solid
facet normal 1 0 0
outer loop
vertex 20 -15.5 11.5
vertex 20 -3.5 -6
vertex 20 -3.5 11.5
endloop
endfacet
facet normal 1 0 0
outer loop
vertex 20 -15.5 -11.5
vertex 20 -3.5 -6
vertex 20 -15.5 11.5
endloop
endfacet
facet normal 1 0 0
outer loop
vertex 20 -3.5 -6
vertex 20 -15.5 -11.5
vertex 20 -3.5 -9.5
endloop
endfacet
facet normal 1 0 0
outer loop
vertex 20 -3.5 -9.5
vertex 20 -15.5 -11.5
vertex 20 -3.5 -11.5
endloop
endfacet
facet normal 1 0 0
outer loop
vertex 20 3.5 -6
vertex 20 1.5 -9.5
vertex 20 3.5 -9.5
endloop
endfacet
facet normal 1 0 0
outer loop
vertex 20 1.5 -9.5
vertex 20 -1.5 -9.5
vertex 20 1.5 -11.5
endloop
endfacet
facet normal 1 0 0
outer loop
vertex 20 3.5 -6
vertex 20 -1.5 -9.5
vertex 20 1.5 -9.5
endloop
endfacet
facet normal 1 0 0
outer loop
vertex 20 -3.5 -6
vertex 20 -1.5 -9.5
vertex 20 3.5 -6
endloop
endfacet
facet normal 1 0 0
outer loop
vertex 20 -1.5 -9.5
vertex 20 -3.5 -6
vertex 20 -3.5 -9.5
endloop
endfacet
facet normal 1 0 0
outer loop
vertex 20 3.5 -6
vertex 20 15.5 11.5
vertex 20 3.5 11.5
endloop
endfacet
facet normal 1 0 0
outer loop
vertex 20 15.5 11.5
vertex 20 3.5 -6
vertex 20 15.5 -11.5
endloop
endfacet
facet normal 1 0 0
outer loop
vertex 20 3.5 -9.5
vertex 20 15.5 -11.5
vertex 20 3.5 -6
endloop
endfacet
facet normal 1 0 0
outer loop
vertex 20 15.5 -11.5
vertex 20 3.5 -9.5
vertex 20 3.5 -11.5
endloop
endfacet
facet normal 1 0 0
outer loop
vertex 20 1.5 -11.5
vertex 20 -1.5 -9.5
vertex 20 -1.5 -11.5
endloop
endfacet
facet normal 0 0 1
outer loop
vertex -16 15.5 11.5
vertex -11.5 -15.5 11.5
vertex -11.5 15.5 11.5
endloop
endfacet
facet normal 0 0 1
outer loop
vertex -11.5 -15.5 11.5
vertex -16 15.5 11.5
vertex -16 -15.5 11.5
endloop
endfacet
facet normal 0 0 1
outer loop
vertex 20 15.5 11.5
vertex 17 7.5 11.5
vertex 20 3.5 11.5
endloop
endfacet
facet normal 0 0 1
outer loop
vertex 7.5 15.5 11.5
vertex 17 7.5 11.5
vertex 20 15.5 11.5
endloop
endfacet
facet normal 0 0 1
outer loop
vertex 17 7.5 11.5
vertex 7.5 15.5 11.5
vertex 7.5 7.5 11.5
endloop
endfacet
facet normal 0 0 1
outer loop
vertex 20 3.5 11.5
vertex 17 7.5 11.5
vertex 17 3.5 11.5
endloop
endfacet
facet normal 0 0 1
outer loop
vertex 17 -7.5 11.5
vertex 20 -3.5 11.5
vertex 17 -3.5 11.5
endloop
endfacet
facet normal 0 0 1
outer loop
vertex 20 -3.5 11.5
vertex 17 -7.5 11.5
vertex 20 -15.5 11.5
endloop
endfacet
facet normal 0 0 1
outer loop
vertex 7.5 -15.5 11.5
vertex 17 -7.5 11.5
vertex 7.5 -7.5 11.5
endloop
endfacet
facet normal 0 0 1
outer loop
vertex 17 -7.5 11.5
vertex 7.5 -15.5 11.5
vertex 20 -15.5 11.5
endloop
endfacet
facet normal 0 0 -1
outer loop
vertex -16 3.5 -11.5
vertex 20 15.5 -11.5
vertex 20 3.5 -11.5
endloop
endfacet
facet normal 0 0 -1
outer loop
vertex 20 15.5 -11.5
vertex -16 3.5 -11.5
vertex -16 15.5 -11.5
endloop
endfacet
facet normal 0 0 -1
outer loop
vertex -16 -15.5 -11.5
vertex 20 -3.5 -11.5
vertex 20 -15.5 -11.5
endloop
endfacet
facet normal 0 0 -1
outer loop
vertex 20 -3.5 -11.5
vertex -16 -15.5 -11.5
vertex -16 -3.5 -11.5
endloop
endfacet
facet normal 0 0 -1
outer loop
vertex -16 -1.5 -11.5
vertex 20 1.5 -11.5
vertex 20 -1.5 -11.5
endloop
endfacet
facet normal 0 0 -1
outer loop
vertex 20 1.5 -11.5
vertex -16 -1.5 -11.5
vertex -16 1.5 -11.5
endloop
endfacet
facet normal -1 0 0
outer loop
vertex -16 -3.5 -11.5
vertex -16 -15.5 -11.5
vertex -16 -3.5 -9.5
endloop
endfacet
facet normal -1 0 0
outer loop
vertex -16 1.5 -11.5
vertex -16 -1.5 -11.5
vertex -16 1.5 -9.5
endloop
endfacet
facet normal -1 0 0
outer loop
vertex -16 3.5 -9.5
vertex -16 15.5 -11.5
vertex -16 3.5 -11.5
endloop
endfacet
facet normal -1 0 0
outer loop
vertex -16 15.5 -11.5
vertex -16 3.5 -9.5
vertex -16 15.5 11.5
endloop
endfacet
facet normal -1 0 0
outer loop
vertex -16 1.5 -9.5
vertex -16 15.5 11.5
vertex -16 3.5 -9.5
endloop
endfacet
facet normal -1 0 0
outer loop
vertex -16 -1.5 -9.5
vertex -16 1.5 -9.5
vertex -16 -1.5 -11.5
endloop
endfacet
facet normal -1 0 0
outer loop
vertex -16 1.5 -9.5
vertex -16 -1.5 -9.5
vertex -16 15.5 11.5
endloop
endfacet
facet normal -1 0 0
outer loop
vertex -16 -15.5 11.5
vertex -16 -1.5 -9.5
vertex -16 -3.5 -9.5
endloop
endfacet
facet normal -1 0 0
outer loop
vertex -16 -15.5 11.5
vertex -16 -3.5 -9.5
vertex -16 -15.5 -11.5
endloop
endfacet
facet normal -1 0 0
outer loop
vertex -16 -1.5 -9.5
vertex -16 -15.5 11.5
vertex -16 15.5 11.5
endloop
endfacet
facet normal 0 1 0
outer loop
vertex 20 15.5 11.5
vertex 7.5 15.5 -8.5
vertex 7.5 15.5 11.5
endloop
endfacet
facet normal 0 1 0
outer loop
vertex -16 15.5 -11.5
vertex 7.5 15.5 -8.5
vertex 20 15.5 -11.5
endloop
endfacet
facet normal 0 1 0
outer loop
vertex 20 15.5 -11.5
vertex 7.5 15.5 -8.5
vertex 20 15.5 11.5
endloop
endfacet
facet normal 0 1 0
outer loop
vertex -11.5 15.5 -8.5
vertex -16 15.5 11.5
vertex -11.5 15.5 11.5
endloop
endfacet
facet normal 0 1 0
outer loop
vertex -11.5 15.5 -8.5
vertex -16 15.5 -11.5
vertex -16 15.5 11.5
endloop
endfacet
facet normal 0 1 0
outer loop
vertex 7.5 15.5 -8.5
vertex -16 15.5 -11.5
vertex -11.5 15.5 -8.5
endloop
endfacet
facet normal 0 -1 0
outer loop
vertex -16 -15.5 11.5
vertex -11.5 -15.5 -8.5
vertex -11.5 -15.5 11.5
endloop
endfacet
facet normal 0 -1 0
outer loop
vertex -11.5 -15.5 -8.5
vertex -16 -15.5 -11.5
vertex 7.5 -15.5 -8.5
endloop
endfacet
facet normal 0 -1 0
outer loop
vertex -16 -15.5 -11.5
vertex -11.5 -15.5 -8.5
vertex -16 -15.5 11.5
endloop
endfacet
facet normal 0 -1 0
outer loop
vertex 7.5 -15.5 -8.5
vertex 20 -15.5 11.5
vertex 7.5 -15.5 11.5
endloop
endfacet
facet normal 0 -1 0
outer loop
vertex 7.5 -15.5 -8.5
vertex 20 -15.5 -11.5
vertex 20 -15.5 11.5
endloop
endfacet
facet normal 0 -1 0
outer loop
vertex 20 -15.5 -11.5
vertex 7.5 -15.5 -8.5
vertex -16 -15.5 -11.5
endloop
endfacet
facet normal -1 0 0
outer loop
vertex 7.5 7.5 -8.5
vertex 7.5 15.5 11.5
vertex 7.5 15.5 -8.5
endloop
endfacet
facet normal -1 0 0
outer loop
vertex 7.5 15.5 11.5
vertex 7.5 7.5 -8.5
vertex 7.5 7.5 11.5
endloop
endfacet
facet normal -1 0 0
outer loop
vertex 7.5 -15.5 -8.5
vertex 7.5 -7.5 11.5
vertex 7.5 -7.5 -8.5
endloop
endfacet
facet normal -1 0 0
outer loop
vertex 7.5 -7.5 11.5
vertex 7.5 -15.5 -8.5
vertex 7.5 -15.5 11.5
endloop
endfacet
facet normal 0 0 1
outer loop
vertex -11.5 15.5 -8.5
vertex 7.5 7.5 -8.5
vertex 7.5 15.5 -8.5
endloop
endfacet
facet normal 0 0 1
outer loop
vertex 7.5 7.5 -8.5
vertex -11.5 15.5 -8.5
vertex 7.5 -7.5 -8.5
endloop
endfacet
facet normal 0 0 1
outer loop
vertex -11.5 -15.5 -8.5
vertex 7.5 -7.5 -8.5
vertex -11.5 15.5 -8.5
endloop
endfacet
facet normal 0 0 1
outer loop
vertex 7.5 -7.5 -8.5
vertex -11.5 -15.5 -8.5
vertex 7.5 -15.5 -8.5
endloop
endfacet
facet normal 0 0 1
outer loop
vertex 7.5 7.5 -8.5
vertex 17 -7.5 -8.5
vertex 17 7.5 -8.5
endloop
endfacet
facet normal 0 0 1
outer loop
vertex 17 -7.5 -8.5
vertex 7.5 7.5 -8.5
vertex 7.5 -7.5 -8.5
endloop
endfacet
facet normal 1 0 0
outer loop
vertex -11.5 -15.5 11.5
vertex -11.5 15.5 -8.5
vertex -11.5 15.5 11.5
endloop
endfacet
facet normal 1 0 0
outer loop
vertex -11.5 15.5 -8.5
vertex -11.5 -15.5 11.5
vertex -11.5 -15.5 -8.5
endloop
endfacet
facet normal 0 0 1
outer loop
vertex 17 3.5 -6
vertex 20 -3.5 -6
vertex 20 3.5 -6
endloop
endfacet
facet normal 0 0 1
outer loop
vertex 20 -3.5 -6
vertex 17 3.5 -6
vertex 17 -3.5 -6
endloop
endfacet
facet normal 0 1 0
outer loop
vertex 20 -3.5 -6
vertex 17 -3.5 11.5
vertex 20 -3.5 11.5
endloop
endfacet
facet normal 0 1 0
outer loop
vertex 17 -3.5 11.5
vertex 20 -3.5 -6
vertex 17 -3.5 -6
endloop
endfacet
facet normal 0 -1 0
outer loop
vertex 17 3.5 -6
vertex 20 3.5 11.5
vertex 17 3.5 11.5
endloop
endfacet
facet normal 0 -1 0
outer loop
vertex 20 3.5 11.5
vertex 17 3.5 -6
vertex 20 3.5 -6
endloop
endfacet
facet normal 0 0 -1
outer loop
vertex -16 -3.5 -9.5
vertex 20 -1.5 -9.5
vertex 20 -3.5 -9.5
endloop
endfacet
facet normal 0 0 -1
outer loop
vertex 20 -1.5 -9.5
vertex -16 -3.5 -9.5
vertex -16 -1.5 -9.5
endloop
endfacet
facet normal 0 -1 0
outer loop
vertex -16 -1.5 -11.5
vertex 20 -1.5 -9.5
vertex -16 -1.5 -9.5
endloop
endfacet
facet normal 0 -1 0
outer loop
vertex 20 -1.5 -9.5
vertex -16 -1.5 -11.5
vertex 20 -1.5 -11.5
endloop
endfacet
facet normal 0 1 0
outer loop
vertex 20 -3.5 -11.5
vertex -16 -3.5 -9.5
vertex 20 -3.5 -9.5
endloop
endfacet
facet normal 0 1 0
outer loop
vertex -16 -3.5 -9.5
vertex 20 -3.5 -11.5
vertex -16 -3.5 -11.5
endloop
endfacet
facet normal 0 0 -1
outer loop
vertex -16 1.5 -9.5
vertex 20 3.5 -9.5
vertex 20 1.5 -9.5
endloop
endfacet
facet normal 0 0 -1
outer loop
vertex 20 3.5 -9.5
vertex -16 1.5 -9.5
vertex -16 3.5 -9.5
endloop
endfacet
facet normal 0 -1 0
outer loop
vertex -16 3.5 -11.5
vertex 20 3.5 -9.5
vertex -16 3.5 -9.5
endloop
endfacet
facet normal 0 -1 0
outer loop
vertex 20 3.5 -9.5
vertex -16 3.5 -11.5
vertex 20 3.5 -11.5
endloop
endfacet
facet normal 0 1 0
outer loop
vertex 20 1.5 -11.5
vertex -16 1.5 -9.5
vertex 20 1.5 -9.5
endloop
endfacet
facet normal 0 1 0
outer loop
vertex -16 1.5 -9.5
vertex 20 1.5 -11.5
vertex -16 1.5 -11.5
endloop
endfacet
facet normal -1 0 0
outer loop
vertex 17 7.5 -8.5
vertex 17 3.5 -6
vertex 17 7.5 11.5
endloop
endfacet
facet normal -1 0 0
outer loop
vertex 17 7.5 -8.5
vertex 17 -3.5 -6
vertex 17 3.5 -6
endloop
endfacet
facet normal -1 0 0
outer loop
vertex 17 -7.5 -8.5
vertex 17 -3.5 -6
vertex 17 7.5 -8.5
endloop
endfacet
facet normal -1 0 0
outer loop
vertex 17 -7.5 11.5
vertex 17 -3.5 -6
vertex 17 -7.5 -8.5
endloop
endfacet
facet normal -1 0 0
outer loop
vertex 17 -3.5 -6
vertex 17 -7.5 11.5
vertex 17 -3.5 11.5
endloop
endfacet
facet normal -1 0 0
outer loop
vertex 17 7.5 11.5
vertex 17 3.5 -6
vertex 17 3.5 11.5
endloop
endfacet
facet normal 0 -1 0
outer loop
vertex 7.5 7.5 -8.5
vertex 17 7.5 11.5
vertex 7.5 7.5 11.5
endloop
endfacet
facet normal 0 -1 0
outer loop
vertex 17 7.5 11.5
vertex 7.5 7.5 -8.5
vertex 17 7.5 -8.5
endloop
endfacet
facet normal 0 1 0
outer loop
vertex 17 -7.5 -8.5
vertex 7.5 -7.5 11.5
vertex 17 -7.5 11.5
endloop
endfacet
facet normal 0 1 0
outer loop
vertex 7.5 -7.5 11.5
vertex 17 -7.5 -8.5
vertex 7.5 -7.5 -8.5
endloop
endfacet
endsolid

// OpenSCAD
difference () {
	translate ([2,0,0]) cube([36,31,23], center=true);
	translate ([-2,0,3]) cube([19,34,23], center=true);
	translate ([13,-2.5,4]) cube([16,2,20],center=true);
	translate ([13,2.5,4]) cube([16,2,20],center=true);
	translate ([3,-2.5,-14.5]) cube([40,2,10],center=true);
	translate ([3,2.5,-14.5]) cube([40,2,10],center=true);
	translate ([12,0,3]) cube ([10,15,23],center=true);
	translate ([15,0,5.5]) cube ([11,5,23],center=true);
}
